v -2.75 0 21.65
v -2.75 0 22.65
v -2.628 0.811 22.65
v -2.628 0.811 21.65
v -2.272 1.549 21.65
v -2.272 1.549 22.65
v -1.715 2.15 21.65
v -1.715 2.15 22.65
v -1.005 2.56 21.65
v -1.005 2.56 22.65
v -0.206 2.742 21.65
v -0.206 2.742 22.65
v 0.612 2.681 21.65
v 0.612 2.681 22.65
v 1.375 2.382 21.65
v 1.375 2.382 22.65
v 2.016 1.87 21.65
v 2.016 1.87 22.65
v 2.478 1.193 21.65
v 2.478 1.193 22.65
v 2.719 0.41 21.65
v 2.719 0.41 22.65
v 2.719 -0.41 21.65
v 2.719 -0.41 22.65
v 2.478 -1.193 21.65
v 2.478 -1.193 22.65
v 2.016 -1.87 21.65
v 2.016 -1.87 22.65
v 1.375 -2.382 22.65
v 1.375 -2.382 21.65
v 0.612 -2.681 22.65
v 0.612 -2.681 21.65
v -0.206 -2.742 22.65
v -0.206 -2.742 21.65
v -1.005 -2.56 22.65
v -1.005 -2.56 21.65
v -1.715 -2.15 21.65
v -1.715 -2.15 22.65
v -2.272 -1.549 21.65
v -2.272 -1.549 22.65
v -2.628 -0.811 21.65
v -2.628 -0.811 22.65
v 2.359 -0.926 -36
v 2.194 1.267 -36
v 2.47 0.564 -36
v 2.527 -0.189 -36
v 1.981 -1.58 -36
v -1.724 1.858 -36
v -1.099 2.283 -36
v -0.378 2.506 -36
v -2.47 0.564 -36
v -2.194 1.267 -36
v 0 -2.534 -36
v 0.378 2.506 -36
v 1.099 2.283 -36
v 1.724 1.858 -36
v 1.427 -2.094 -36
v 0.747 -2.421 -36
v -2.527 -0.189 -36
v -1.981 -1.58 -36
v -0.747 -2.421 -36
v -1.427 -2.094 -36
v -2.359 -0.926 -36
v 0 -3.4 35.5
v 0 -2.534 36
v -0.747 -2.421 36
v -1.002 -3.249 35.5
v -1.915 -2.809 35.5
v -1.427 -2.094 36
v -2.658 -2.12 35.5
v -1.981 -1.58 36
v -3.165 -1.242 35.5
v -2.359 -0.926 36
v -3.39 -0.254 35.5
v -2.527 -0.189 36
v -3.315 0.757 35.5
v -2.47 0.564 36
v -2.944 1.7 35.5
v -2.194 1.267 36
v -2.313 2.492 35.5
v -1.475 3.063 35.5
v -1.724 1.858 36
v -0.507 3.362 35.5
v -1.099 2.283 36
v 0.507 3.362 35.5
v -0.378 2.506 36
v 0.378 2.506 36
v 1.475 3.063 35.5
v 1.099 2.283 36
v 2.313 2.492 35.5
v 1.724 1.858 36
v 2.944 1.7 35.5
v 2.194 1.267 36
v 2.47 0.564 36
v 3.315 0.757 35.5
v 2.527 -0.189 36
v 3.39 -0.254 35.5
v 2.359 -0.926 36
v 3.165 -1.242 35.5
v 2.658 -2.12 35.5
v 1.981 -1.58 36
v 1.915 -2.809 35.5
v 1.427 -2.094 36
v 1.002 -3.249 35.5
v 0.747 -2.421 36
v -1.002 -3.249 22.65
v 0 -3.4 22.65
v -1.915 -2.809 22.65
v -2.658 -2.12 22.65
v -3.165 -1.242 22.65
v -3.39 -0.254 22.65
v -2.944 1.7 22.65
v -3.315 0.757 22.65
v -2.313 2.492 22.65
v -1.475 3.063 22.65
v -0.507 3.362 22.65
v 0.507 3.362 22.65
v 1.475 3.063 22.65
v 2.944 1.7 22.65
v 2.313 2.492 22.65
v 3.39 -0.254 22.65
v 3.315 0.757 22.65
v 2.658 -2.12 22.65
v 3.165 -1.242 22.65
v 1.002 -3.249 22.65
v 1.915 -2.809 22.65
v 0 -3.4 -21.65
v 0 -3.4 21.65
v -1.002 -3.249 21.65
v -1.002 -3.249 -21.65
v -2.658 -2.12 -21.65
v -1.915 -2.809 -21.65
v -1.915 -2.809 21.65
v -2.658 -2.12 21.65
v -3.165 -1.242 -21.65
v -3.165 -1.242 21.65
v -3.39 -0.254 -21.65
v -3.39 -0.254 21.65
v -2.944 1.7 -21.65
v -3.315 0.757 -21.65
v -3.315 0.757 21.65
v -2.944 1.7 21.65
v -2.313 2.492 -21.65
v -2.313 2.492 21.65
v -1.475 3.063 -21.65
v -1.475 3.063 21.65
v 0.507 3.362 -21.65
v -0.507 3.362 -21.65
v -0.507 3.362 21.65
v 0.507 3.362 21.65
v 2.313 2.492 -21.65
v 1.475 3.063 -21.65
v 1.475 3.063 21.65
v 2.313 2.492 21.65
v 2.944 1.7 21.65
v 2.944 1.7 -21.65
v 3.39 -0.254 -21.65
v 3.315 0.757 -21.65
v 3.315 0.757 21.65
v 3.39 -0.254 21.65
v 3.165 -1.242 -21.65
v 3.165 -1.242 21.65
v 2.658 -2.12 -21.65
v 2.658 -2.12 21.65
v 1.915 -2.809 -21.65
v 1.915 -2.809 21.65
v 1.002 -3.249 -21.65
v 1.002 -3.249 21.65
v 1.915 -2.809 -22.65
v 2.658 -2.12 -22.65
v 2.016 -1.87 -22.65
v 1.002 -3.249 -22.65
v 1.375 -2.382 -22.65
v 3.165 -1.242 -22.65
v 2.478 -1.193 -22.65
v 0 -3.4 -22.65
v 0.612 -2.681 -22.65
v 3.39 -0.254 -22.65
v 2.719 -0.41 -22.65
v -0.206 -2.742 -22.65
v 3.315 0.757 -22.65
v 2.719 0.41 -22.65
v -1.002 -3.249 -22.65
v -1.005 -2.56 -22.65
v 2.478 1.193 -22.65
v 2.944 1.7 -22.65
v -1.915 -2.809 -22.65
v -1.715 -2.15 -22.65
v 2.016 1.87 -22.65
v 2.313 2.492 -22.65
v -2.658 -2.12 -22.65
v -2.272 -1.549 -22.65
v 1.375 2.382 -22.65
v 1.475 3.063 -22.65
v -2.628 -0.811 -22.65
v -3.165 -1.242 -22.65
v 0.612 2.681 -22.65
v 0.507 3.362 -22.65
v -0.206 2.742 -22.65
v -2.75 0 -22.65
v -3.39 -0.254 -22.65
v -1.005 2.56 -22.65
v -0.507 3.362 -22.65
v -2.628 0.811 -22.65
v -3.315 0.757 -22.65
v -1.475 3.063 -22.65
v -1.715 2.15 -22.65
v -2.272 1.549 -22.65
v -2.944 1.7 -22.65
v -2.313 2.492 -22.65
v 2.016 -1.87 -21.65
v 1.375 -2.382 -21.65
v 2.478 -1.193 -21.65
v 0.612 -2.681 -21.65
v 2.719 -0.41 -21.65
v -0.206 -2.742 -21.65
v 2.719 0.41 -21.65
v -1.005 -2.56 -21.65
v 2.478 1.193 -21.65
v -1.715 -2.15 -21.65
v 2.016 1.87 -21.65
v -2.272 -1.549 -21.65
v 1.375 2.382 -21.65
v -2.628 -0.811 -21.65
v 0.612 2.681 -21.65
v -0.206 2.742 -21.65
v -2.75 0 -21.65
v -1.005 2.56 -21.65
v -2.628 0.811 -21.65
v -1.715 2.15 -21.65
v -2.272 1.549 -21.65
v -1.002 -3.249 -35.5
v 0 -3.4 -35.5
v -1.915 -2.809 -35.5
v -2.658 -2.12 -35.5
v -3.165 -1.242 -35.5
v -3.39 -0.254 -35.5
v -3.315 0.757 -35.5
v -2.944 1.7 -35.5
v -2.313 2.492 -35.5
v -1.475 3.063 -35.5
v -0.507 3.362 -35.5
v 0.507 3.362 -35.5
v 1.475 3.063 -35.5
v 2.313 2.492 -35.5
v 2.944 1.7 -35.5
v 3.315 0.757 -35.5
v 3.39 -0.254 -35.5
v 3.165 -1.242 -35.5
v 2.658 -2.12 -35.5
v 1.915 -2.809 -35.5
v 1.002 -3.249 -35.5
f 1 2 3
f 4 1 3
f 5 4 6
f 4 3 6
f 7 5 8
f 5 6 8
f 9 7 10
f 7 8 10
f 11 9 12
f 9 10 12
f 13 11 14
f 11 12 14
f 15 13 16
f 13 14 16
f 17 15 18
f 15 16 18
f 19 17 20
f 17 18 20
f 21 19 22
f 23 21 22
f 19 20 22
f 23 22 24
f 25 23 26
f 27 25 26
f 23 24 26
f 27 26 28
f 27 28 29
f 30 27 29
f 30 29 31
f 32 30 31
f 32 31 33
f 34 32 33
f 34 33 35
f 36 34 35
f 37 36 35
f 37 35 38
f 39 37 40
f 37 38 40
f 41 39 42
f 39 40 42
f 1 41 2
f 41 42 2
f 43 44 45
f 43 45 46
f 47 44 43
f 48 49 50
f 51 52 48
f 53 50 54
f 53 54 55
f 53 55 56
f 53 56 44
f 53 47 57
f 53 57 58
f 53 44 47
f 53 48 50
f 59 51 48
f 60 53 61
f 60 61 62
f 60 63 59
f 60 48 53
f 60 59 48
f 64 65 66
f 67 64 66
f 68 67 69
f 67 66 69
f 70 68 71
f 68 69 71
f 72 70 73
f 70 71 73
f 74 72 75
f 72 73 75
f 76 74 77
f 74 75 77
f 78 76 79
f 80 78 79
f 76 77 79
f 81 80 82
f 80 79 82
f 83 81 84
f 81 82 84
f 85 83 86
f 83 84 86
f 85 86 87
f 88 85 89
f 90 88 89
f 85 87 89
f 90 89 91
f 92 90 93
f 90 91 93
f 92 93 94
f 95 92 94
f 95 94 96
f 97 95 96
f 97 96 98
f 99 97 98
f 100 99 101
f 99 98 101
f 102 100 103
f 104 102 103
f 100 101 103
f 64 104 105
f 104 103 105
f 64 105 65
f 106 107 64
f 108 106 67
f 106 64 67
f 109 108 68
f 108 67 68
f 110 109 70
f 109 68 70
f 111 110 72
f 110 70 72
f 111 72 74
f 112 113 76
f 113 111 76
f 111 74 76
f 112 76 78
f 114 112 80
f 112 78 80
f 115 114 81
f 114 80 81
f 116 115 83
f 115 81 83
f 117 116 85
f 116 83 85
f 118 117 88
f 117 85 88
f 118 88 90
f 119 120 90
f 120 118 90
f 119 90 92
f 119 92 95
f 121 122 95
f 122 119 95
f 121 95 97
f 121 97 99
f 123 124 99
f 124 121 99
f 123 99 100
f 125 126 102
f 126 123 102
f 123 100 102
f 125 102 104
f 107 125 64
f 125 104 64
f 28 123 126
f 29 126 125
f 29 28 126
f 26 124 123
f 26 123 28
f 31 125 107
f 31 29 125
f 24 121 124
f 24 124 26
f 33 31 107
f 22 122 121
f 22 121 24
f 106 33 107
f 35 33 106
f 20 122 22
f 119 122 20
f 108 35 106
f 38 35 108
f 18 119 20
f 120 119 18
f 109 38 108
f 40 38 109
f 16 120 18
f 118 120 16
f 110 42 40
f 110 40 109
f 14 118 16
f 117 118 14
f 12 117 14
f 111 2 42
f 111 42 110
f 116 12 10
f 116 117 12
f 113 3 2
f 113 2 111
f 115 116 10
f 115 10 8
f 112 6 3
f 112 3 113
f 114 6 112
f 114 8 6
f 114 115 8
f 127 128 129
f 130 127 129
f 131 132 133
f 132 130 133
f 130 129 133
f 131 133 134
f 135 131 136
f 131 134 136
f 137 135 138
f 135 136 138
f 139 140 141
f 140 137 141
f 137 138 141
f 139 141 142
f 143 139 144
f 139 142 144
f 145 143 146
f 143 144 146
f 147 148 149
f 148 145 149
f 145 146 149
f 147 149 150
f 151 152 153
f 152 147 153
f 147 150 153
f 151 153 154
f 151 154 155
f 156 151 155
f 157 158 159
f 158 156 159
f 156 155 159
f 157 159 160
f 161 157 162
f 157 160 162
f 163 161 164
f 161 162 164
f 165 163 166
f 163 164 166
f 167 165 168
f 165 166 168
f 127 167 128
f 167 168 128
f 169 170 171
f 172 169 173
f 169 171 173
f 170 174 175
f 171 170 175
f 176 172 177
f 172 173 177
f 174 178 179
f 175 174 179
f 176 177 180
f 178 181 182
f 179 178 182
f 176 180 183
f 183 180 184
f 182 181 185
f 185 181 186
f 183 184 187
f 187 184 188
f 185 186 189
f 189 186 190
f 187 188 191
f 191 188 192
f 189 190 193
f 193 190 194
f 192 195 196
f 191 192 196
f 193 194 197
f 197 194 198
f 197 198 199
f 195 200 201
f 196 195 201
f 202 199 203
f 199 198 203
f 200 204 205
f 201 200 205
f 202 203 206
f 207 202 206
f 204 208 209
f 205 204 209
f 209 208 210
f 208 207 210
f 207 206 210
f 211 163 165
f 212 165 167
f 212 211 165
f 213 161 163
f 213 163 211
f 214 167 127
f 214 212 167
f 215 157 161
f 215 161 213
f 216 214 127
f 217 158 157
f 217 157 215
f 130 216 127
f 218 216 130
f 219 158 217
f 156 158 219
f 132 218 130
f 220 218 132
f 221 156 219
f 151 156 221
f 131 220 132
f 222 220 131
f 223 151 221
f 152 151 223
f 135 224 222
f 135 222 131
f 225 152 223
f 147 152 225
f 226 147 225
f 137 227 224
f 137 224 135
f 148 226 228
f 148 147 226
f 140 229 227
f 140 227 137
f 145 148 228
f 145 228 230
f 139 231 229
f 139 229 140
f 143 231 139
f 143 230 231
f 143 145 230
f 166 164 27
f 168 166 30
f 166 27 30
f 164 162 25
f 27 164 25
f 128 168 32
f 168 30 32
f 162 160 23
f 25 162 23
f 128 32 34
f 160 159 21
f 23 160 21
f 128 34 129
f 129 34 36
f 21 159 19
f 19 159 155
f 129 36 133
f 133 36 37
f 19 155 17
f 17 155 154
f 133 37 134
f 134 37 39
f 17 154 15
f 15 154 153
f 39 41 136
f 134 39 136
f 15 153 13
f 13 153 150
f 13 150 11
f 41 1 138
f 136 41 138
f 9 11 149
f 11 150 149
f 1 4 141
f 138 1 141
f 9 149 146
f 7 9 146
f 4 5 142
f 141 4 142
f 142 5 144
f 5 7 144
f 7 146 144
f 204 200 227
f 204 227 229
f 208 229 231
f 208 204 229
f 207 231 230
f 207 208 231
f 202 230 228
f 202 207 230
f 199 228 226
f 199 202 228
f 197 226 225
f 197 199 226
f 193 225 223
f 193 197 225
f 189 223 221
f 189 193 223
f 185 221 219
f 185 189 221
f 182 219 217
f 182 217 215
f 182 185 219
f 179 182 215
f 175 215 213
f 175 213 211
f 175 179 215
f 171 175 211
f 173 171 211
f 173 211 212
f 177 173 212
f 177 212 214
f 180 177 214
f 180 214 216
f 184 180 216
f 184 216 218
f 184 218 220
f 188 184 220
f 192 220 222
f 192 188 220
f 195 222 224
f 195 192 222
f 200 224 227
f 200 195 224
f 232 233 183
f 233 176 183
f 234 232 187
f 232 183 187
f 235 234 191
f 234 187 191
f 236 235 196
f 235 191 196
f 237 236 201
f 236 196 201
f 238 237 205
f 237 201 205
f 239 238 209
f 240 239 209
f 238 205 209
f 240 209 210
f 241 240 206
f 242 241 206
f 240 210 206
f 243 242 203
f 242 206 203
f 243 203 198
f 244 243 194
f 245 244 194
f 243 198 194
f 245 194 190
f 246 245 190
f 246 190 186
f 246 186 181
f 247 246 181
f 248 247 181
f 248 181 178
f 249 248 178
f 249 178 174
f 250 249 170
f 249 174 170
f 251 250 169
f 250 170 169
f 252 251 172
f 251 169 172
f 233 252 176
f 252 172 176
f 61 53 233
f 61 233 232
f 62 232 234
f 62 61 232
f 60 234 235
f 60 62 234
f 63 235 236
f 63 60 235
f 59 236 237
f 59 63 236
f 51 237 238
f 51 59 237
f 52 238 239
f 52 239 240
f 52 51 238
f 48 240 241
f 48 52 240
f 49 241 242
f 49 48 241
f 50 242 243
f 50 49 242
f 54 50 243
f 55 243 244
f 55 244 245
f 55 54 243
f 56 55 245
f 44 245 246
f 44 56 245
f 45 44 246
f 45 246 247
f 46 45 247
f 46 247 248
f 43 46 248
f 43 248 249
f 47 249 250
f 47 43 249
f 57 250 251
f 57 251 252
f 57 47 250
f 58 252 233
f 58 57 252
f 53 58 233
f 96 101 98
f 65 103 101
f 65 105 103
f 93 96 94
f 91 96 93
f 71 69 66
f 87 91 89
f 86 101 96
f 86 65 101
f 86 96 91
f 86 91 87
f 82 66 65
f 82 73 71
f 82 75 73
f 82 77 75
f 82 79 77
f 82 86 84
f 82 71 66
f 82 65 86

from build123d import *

# Parameters (mm, degrees)
CHAMFER1_SIZE      = 0.5
CHAMFER1_SIZE2     = 0.866025404
CUT_EXTRUDE1_START = -13.35
SKETCH2_OUTSIDE_W  = 23.328
SKETCH2_OUTSIDE_H  = 23.328
SKETCH2_OUTSIDE_R  = 2.75
CUT_EXTRUDE1_DEPTH = 1


with BuildPart() as part:
    # Sketch1 → Revolve1 (revolve)
    with BuildSketch(Plane(origin=(0, 0, 0), x_dir=(0, 0, -1), z_dir=(1, 0, 0)), mode=Mode.PRIVATE) as revolve1_sk:
        Polygon((-36, 0), (-36, 3.4), (2.432191781, 3.4), (36, 3.4), (36, 0), align=None)
    revolve(revolve1_sk.sketch.rotate(Axis((0, 0, 36), (0, 0, -1)), 180), axis=Axis((0, 0, 36), (0, 0, -1)))

    # Chamfer1
    chamfer1_edges = [part.edges().sort_by_distance(p)[0] for p in [
        (0, 3.4, -36),
        (0, 3.4, 36),
    ]]
    chamfer1_side = [part.faces().sort_by_distance(p)[0] for p in [
        (0, 3.4, 0),
    ]]
    chamfer(chamfer1_edges, length=CHAMFER1_SIZE, length2=CHAMFER1_SIZE2, reference=chamfer1_side[0])

    # Sketch2 outside → Cut-Extrude1 (cut)
    with BuildSketch(Plane(origin=(0, 0, -36), x_dir=(-1, 0, 0), z_dir=(0, 0, -1)).offset(CUT_EXTRUDE1_START)):
        Rectangle(SKETCH2_OUTSIDE_W, SKETCH2_OUTSIDE_H)
        Circle(SKETCH2_OUTSIDE_R, mode=Mode.SUBTRACT)
    cut_extrude1 = extrude(amount=-CUT_EXTRUDE1_DEPTH, mode=Mode.SUBTRACT)

    # Mirror1: Cut-Extrude1 across plane
    add(cut_extrude1.mirror(Plane.XY), mode=Mode.SUBTRACT)


solid = part.part
